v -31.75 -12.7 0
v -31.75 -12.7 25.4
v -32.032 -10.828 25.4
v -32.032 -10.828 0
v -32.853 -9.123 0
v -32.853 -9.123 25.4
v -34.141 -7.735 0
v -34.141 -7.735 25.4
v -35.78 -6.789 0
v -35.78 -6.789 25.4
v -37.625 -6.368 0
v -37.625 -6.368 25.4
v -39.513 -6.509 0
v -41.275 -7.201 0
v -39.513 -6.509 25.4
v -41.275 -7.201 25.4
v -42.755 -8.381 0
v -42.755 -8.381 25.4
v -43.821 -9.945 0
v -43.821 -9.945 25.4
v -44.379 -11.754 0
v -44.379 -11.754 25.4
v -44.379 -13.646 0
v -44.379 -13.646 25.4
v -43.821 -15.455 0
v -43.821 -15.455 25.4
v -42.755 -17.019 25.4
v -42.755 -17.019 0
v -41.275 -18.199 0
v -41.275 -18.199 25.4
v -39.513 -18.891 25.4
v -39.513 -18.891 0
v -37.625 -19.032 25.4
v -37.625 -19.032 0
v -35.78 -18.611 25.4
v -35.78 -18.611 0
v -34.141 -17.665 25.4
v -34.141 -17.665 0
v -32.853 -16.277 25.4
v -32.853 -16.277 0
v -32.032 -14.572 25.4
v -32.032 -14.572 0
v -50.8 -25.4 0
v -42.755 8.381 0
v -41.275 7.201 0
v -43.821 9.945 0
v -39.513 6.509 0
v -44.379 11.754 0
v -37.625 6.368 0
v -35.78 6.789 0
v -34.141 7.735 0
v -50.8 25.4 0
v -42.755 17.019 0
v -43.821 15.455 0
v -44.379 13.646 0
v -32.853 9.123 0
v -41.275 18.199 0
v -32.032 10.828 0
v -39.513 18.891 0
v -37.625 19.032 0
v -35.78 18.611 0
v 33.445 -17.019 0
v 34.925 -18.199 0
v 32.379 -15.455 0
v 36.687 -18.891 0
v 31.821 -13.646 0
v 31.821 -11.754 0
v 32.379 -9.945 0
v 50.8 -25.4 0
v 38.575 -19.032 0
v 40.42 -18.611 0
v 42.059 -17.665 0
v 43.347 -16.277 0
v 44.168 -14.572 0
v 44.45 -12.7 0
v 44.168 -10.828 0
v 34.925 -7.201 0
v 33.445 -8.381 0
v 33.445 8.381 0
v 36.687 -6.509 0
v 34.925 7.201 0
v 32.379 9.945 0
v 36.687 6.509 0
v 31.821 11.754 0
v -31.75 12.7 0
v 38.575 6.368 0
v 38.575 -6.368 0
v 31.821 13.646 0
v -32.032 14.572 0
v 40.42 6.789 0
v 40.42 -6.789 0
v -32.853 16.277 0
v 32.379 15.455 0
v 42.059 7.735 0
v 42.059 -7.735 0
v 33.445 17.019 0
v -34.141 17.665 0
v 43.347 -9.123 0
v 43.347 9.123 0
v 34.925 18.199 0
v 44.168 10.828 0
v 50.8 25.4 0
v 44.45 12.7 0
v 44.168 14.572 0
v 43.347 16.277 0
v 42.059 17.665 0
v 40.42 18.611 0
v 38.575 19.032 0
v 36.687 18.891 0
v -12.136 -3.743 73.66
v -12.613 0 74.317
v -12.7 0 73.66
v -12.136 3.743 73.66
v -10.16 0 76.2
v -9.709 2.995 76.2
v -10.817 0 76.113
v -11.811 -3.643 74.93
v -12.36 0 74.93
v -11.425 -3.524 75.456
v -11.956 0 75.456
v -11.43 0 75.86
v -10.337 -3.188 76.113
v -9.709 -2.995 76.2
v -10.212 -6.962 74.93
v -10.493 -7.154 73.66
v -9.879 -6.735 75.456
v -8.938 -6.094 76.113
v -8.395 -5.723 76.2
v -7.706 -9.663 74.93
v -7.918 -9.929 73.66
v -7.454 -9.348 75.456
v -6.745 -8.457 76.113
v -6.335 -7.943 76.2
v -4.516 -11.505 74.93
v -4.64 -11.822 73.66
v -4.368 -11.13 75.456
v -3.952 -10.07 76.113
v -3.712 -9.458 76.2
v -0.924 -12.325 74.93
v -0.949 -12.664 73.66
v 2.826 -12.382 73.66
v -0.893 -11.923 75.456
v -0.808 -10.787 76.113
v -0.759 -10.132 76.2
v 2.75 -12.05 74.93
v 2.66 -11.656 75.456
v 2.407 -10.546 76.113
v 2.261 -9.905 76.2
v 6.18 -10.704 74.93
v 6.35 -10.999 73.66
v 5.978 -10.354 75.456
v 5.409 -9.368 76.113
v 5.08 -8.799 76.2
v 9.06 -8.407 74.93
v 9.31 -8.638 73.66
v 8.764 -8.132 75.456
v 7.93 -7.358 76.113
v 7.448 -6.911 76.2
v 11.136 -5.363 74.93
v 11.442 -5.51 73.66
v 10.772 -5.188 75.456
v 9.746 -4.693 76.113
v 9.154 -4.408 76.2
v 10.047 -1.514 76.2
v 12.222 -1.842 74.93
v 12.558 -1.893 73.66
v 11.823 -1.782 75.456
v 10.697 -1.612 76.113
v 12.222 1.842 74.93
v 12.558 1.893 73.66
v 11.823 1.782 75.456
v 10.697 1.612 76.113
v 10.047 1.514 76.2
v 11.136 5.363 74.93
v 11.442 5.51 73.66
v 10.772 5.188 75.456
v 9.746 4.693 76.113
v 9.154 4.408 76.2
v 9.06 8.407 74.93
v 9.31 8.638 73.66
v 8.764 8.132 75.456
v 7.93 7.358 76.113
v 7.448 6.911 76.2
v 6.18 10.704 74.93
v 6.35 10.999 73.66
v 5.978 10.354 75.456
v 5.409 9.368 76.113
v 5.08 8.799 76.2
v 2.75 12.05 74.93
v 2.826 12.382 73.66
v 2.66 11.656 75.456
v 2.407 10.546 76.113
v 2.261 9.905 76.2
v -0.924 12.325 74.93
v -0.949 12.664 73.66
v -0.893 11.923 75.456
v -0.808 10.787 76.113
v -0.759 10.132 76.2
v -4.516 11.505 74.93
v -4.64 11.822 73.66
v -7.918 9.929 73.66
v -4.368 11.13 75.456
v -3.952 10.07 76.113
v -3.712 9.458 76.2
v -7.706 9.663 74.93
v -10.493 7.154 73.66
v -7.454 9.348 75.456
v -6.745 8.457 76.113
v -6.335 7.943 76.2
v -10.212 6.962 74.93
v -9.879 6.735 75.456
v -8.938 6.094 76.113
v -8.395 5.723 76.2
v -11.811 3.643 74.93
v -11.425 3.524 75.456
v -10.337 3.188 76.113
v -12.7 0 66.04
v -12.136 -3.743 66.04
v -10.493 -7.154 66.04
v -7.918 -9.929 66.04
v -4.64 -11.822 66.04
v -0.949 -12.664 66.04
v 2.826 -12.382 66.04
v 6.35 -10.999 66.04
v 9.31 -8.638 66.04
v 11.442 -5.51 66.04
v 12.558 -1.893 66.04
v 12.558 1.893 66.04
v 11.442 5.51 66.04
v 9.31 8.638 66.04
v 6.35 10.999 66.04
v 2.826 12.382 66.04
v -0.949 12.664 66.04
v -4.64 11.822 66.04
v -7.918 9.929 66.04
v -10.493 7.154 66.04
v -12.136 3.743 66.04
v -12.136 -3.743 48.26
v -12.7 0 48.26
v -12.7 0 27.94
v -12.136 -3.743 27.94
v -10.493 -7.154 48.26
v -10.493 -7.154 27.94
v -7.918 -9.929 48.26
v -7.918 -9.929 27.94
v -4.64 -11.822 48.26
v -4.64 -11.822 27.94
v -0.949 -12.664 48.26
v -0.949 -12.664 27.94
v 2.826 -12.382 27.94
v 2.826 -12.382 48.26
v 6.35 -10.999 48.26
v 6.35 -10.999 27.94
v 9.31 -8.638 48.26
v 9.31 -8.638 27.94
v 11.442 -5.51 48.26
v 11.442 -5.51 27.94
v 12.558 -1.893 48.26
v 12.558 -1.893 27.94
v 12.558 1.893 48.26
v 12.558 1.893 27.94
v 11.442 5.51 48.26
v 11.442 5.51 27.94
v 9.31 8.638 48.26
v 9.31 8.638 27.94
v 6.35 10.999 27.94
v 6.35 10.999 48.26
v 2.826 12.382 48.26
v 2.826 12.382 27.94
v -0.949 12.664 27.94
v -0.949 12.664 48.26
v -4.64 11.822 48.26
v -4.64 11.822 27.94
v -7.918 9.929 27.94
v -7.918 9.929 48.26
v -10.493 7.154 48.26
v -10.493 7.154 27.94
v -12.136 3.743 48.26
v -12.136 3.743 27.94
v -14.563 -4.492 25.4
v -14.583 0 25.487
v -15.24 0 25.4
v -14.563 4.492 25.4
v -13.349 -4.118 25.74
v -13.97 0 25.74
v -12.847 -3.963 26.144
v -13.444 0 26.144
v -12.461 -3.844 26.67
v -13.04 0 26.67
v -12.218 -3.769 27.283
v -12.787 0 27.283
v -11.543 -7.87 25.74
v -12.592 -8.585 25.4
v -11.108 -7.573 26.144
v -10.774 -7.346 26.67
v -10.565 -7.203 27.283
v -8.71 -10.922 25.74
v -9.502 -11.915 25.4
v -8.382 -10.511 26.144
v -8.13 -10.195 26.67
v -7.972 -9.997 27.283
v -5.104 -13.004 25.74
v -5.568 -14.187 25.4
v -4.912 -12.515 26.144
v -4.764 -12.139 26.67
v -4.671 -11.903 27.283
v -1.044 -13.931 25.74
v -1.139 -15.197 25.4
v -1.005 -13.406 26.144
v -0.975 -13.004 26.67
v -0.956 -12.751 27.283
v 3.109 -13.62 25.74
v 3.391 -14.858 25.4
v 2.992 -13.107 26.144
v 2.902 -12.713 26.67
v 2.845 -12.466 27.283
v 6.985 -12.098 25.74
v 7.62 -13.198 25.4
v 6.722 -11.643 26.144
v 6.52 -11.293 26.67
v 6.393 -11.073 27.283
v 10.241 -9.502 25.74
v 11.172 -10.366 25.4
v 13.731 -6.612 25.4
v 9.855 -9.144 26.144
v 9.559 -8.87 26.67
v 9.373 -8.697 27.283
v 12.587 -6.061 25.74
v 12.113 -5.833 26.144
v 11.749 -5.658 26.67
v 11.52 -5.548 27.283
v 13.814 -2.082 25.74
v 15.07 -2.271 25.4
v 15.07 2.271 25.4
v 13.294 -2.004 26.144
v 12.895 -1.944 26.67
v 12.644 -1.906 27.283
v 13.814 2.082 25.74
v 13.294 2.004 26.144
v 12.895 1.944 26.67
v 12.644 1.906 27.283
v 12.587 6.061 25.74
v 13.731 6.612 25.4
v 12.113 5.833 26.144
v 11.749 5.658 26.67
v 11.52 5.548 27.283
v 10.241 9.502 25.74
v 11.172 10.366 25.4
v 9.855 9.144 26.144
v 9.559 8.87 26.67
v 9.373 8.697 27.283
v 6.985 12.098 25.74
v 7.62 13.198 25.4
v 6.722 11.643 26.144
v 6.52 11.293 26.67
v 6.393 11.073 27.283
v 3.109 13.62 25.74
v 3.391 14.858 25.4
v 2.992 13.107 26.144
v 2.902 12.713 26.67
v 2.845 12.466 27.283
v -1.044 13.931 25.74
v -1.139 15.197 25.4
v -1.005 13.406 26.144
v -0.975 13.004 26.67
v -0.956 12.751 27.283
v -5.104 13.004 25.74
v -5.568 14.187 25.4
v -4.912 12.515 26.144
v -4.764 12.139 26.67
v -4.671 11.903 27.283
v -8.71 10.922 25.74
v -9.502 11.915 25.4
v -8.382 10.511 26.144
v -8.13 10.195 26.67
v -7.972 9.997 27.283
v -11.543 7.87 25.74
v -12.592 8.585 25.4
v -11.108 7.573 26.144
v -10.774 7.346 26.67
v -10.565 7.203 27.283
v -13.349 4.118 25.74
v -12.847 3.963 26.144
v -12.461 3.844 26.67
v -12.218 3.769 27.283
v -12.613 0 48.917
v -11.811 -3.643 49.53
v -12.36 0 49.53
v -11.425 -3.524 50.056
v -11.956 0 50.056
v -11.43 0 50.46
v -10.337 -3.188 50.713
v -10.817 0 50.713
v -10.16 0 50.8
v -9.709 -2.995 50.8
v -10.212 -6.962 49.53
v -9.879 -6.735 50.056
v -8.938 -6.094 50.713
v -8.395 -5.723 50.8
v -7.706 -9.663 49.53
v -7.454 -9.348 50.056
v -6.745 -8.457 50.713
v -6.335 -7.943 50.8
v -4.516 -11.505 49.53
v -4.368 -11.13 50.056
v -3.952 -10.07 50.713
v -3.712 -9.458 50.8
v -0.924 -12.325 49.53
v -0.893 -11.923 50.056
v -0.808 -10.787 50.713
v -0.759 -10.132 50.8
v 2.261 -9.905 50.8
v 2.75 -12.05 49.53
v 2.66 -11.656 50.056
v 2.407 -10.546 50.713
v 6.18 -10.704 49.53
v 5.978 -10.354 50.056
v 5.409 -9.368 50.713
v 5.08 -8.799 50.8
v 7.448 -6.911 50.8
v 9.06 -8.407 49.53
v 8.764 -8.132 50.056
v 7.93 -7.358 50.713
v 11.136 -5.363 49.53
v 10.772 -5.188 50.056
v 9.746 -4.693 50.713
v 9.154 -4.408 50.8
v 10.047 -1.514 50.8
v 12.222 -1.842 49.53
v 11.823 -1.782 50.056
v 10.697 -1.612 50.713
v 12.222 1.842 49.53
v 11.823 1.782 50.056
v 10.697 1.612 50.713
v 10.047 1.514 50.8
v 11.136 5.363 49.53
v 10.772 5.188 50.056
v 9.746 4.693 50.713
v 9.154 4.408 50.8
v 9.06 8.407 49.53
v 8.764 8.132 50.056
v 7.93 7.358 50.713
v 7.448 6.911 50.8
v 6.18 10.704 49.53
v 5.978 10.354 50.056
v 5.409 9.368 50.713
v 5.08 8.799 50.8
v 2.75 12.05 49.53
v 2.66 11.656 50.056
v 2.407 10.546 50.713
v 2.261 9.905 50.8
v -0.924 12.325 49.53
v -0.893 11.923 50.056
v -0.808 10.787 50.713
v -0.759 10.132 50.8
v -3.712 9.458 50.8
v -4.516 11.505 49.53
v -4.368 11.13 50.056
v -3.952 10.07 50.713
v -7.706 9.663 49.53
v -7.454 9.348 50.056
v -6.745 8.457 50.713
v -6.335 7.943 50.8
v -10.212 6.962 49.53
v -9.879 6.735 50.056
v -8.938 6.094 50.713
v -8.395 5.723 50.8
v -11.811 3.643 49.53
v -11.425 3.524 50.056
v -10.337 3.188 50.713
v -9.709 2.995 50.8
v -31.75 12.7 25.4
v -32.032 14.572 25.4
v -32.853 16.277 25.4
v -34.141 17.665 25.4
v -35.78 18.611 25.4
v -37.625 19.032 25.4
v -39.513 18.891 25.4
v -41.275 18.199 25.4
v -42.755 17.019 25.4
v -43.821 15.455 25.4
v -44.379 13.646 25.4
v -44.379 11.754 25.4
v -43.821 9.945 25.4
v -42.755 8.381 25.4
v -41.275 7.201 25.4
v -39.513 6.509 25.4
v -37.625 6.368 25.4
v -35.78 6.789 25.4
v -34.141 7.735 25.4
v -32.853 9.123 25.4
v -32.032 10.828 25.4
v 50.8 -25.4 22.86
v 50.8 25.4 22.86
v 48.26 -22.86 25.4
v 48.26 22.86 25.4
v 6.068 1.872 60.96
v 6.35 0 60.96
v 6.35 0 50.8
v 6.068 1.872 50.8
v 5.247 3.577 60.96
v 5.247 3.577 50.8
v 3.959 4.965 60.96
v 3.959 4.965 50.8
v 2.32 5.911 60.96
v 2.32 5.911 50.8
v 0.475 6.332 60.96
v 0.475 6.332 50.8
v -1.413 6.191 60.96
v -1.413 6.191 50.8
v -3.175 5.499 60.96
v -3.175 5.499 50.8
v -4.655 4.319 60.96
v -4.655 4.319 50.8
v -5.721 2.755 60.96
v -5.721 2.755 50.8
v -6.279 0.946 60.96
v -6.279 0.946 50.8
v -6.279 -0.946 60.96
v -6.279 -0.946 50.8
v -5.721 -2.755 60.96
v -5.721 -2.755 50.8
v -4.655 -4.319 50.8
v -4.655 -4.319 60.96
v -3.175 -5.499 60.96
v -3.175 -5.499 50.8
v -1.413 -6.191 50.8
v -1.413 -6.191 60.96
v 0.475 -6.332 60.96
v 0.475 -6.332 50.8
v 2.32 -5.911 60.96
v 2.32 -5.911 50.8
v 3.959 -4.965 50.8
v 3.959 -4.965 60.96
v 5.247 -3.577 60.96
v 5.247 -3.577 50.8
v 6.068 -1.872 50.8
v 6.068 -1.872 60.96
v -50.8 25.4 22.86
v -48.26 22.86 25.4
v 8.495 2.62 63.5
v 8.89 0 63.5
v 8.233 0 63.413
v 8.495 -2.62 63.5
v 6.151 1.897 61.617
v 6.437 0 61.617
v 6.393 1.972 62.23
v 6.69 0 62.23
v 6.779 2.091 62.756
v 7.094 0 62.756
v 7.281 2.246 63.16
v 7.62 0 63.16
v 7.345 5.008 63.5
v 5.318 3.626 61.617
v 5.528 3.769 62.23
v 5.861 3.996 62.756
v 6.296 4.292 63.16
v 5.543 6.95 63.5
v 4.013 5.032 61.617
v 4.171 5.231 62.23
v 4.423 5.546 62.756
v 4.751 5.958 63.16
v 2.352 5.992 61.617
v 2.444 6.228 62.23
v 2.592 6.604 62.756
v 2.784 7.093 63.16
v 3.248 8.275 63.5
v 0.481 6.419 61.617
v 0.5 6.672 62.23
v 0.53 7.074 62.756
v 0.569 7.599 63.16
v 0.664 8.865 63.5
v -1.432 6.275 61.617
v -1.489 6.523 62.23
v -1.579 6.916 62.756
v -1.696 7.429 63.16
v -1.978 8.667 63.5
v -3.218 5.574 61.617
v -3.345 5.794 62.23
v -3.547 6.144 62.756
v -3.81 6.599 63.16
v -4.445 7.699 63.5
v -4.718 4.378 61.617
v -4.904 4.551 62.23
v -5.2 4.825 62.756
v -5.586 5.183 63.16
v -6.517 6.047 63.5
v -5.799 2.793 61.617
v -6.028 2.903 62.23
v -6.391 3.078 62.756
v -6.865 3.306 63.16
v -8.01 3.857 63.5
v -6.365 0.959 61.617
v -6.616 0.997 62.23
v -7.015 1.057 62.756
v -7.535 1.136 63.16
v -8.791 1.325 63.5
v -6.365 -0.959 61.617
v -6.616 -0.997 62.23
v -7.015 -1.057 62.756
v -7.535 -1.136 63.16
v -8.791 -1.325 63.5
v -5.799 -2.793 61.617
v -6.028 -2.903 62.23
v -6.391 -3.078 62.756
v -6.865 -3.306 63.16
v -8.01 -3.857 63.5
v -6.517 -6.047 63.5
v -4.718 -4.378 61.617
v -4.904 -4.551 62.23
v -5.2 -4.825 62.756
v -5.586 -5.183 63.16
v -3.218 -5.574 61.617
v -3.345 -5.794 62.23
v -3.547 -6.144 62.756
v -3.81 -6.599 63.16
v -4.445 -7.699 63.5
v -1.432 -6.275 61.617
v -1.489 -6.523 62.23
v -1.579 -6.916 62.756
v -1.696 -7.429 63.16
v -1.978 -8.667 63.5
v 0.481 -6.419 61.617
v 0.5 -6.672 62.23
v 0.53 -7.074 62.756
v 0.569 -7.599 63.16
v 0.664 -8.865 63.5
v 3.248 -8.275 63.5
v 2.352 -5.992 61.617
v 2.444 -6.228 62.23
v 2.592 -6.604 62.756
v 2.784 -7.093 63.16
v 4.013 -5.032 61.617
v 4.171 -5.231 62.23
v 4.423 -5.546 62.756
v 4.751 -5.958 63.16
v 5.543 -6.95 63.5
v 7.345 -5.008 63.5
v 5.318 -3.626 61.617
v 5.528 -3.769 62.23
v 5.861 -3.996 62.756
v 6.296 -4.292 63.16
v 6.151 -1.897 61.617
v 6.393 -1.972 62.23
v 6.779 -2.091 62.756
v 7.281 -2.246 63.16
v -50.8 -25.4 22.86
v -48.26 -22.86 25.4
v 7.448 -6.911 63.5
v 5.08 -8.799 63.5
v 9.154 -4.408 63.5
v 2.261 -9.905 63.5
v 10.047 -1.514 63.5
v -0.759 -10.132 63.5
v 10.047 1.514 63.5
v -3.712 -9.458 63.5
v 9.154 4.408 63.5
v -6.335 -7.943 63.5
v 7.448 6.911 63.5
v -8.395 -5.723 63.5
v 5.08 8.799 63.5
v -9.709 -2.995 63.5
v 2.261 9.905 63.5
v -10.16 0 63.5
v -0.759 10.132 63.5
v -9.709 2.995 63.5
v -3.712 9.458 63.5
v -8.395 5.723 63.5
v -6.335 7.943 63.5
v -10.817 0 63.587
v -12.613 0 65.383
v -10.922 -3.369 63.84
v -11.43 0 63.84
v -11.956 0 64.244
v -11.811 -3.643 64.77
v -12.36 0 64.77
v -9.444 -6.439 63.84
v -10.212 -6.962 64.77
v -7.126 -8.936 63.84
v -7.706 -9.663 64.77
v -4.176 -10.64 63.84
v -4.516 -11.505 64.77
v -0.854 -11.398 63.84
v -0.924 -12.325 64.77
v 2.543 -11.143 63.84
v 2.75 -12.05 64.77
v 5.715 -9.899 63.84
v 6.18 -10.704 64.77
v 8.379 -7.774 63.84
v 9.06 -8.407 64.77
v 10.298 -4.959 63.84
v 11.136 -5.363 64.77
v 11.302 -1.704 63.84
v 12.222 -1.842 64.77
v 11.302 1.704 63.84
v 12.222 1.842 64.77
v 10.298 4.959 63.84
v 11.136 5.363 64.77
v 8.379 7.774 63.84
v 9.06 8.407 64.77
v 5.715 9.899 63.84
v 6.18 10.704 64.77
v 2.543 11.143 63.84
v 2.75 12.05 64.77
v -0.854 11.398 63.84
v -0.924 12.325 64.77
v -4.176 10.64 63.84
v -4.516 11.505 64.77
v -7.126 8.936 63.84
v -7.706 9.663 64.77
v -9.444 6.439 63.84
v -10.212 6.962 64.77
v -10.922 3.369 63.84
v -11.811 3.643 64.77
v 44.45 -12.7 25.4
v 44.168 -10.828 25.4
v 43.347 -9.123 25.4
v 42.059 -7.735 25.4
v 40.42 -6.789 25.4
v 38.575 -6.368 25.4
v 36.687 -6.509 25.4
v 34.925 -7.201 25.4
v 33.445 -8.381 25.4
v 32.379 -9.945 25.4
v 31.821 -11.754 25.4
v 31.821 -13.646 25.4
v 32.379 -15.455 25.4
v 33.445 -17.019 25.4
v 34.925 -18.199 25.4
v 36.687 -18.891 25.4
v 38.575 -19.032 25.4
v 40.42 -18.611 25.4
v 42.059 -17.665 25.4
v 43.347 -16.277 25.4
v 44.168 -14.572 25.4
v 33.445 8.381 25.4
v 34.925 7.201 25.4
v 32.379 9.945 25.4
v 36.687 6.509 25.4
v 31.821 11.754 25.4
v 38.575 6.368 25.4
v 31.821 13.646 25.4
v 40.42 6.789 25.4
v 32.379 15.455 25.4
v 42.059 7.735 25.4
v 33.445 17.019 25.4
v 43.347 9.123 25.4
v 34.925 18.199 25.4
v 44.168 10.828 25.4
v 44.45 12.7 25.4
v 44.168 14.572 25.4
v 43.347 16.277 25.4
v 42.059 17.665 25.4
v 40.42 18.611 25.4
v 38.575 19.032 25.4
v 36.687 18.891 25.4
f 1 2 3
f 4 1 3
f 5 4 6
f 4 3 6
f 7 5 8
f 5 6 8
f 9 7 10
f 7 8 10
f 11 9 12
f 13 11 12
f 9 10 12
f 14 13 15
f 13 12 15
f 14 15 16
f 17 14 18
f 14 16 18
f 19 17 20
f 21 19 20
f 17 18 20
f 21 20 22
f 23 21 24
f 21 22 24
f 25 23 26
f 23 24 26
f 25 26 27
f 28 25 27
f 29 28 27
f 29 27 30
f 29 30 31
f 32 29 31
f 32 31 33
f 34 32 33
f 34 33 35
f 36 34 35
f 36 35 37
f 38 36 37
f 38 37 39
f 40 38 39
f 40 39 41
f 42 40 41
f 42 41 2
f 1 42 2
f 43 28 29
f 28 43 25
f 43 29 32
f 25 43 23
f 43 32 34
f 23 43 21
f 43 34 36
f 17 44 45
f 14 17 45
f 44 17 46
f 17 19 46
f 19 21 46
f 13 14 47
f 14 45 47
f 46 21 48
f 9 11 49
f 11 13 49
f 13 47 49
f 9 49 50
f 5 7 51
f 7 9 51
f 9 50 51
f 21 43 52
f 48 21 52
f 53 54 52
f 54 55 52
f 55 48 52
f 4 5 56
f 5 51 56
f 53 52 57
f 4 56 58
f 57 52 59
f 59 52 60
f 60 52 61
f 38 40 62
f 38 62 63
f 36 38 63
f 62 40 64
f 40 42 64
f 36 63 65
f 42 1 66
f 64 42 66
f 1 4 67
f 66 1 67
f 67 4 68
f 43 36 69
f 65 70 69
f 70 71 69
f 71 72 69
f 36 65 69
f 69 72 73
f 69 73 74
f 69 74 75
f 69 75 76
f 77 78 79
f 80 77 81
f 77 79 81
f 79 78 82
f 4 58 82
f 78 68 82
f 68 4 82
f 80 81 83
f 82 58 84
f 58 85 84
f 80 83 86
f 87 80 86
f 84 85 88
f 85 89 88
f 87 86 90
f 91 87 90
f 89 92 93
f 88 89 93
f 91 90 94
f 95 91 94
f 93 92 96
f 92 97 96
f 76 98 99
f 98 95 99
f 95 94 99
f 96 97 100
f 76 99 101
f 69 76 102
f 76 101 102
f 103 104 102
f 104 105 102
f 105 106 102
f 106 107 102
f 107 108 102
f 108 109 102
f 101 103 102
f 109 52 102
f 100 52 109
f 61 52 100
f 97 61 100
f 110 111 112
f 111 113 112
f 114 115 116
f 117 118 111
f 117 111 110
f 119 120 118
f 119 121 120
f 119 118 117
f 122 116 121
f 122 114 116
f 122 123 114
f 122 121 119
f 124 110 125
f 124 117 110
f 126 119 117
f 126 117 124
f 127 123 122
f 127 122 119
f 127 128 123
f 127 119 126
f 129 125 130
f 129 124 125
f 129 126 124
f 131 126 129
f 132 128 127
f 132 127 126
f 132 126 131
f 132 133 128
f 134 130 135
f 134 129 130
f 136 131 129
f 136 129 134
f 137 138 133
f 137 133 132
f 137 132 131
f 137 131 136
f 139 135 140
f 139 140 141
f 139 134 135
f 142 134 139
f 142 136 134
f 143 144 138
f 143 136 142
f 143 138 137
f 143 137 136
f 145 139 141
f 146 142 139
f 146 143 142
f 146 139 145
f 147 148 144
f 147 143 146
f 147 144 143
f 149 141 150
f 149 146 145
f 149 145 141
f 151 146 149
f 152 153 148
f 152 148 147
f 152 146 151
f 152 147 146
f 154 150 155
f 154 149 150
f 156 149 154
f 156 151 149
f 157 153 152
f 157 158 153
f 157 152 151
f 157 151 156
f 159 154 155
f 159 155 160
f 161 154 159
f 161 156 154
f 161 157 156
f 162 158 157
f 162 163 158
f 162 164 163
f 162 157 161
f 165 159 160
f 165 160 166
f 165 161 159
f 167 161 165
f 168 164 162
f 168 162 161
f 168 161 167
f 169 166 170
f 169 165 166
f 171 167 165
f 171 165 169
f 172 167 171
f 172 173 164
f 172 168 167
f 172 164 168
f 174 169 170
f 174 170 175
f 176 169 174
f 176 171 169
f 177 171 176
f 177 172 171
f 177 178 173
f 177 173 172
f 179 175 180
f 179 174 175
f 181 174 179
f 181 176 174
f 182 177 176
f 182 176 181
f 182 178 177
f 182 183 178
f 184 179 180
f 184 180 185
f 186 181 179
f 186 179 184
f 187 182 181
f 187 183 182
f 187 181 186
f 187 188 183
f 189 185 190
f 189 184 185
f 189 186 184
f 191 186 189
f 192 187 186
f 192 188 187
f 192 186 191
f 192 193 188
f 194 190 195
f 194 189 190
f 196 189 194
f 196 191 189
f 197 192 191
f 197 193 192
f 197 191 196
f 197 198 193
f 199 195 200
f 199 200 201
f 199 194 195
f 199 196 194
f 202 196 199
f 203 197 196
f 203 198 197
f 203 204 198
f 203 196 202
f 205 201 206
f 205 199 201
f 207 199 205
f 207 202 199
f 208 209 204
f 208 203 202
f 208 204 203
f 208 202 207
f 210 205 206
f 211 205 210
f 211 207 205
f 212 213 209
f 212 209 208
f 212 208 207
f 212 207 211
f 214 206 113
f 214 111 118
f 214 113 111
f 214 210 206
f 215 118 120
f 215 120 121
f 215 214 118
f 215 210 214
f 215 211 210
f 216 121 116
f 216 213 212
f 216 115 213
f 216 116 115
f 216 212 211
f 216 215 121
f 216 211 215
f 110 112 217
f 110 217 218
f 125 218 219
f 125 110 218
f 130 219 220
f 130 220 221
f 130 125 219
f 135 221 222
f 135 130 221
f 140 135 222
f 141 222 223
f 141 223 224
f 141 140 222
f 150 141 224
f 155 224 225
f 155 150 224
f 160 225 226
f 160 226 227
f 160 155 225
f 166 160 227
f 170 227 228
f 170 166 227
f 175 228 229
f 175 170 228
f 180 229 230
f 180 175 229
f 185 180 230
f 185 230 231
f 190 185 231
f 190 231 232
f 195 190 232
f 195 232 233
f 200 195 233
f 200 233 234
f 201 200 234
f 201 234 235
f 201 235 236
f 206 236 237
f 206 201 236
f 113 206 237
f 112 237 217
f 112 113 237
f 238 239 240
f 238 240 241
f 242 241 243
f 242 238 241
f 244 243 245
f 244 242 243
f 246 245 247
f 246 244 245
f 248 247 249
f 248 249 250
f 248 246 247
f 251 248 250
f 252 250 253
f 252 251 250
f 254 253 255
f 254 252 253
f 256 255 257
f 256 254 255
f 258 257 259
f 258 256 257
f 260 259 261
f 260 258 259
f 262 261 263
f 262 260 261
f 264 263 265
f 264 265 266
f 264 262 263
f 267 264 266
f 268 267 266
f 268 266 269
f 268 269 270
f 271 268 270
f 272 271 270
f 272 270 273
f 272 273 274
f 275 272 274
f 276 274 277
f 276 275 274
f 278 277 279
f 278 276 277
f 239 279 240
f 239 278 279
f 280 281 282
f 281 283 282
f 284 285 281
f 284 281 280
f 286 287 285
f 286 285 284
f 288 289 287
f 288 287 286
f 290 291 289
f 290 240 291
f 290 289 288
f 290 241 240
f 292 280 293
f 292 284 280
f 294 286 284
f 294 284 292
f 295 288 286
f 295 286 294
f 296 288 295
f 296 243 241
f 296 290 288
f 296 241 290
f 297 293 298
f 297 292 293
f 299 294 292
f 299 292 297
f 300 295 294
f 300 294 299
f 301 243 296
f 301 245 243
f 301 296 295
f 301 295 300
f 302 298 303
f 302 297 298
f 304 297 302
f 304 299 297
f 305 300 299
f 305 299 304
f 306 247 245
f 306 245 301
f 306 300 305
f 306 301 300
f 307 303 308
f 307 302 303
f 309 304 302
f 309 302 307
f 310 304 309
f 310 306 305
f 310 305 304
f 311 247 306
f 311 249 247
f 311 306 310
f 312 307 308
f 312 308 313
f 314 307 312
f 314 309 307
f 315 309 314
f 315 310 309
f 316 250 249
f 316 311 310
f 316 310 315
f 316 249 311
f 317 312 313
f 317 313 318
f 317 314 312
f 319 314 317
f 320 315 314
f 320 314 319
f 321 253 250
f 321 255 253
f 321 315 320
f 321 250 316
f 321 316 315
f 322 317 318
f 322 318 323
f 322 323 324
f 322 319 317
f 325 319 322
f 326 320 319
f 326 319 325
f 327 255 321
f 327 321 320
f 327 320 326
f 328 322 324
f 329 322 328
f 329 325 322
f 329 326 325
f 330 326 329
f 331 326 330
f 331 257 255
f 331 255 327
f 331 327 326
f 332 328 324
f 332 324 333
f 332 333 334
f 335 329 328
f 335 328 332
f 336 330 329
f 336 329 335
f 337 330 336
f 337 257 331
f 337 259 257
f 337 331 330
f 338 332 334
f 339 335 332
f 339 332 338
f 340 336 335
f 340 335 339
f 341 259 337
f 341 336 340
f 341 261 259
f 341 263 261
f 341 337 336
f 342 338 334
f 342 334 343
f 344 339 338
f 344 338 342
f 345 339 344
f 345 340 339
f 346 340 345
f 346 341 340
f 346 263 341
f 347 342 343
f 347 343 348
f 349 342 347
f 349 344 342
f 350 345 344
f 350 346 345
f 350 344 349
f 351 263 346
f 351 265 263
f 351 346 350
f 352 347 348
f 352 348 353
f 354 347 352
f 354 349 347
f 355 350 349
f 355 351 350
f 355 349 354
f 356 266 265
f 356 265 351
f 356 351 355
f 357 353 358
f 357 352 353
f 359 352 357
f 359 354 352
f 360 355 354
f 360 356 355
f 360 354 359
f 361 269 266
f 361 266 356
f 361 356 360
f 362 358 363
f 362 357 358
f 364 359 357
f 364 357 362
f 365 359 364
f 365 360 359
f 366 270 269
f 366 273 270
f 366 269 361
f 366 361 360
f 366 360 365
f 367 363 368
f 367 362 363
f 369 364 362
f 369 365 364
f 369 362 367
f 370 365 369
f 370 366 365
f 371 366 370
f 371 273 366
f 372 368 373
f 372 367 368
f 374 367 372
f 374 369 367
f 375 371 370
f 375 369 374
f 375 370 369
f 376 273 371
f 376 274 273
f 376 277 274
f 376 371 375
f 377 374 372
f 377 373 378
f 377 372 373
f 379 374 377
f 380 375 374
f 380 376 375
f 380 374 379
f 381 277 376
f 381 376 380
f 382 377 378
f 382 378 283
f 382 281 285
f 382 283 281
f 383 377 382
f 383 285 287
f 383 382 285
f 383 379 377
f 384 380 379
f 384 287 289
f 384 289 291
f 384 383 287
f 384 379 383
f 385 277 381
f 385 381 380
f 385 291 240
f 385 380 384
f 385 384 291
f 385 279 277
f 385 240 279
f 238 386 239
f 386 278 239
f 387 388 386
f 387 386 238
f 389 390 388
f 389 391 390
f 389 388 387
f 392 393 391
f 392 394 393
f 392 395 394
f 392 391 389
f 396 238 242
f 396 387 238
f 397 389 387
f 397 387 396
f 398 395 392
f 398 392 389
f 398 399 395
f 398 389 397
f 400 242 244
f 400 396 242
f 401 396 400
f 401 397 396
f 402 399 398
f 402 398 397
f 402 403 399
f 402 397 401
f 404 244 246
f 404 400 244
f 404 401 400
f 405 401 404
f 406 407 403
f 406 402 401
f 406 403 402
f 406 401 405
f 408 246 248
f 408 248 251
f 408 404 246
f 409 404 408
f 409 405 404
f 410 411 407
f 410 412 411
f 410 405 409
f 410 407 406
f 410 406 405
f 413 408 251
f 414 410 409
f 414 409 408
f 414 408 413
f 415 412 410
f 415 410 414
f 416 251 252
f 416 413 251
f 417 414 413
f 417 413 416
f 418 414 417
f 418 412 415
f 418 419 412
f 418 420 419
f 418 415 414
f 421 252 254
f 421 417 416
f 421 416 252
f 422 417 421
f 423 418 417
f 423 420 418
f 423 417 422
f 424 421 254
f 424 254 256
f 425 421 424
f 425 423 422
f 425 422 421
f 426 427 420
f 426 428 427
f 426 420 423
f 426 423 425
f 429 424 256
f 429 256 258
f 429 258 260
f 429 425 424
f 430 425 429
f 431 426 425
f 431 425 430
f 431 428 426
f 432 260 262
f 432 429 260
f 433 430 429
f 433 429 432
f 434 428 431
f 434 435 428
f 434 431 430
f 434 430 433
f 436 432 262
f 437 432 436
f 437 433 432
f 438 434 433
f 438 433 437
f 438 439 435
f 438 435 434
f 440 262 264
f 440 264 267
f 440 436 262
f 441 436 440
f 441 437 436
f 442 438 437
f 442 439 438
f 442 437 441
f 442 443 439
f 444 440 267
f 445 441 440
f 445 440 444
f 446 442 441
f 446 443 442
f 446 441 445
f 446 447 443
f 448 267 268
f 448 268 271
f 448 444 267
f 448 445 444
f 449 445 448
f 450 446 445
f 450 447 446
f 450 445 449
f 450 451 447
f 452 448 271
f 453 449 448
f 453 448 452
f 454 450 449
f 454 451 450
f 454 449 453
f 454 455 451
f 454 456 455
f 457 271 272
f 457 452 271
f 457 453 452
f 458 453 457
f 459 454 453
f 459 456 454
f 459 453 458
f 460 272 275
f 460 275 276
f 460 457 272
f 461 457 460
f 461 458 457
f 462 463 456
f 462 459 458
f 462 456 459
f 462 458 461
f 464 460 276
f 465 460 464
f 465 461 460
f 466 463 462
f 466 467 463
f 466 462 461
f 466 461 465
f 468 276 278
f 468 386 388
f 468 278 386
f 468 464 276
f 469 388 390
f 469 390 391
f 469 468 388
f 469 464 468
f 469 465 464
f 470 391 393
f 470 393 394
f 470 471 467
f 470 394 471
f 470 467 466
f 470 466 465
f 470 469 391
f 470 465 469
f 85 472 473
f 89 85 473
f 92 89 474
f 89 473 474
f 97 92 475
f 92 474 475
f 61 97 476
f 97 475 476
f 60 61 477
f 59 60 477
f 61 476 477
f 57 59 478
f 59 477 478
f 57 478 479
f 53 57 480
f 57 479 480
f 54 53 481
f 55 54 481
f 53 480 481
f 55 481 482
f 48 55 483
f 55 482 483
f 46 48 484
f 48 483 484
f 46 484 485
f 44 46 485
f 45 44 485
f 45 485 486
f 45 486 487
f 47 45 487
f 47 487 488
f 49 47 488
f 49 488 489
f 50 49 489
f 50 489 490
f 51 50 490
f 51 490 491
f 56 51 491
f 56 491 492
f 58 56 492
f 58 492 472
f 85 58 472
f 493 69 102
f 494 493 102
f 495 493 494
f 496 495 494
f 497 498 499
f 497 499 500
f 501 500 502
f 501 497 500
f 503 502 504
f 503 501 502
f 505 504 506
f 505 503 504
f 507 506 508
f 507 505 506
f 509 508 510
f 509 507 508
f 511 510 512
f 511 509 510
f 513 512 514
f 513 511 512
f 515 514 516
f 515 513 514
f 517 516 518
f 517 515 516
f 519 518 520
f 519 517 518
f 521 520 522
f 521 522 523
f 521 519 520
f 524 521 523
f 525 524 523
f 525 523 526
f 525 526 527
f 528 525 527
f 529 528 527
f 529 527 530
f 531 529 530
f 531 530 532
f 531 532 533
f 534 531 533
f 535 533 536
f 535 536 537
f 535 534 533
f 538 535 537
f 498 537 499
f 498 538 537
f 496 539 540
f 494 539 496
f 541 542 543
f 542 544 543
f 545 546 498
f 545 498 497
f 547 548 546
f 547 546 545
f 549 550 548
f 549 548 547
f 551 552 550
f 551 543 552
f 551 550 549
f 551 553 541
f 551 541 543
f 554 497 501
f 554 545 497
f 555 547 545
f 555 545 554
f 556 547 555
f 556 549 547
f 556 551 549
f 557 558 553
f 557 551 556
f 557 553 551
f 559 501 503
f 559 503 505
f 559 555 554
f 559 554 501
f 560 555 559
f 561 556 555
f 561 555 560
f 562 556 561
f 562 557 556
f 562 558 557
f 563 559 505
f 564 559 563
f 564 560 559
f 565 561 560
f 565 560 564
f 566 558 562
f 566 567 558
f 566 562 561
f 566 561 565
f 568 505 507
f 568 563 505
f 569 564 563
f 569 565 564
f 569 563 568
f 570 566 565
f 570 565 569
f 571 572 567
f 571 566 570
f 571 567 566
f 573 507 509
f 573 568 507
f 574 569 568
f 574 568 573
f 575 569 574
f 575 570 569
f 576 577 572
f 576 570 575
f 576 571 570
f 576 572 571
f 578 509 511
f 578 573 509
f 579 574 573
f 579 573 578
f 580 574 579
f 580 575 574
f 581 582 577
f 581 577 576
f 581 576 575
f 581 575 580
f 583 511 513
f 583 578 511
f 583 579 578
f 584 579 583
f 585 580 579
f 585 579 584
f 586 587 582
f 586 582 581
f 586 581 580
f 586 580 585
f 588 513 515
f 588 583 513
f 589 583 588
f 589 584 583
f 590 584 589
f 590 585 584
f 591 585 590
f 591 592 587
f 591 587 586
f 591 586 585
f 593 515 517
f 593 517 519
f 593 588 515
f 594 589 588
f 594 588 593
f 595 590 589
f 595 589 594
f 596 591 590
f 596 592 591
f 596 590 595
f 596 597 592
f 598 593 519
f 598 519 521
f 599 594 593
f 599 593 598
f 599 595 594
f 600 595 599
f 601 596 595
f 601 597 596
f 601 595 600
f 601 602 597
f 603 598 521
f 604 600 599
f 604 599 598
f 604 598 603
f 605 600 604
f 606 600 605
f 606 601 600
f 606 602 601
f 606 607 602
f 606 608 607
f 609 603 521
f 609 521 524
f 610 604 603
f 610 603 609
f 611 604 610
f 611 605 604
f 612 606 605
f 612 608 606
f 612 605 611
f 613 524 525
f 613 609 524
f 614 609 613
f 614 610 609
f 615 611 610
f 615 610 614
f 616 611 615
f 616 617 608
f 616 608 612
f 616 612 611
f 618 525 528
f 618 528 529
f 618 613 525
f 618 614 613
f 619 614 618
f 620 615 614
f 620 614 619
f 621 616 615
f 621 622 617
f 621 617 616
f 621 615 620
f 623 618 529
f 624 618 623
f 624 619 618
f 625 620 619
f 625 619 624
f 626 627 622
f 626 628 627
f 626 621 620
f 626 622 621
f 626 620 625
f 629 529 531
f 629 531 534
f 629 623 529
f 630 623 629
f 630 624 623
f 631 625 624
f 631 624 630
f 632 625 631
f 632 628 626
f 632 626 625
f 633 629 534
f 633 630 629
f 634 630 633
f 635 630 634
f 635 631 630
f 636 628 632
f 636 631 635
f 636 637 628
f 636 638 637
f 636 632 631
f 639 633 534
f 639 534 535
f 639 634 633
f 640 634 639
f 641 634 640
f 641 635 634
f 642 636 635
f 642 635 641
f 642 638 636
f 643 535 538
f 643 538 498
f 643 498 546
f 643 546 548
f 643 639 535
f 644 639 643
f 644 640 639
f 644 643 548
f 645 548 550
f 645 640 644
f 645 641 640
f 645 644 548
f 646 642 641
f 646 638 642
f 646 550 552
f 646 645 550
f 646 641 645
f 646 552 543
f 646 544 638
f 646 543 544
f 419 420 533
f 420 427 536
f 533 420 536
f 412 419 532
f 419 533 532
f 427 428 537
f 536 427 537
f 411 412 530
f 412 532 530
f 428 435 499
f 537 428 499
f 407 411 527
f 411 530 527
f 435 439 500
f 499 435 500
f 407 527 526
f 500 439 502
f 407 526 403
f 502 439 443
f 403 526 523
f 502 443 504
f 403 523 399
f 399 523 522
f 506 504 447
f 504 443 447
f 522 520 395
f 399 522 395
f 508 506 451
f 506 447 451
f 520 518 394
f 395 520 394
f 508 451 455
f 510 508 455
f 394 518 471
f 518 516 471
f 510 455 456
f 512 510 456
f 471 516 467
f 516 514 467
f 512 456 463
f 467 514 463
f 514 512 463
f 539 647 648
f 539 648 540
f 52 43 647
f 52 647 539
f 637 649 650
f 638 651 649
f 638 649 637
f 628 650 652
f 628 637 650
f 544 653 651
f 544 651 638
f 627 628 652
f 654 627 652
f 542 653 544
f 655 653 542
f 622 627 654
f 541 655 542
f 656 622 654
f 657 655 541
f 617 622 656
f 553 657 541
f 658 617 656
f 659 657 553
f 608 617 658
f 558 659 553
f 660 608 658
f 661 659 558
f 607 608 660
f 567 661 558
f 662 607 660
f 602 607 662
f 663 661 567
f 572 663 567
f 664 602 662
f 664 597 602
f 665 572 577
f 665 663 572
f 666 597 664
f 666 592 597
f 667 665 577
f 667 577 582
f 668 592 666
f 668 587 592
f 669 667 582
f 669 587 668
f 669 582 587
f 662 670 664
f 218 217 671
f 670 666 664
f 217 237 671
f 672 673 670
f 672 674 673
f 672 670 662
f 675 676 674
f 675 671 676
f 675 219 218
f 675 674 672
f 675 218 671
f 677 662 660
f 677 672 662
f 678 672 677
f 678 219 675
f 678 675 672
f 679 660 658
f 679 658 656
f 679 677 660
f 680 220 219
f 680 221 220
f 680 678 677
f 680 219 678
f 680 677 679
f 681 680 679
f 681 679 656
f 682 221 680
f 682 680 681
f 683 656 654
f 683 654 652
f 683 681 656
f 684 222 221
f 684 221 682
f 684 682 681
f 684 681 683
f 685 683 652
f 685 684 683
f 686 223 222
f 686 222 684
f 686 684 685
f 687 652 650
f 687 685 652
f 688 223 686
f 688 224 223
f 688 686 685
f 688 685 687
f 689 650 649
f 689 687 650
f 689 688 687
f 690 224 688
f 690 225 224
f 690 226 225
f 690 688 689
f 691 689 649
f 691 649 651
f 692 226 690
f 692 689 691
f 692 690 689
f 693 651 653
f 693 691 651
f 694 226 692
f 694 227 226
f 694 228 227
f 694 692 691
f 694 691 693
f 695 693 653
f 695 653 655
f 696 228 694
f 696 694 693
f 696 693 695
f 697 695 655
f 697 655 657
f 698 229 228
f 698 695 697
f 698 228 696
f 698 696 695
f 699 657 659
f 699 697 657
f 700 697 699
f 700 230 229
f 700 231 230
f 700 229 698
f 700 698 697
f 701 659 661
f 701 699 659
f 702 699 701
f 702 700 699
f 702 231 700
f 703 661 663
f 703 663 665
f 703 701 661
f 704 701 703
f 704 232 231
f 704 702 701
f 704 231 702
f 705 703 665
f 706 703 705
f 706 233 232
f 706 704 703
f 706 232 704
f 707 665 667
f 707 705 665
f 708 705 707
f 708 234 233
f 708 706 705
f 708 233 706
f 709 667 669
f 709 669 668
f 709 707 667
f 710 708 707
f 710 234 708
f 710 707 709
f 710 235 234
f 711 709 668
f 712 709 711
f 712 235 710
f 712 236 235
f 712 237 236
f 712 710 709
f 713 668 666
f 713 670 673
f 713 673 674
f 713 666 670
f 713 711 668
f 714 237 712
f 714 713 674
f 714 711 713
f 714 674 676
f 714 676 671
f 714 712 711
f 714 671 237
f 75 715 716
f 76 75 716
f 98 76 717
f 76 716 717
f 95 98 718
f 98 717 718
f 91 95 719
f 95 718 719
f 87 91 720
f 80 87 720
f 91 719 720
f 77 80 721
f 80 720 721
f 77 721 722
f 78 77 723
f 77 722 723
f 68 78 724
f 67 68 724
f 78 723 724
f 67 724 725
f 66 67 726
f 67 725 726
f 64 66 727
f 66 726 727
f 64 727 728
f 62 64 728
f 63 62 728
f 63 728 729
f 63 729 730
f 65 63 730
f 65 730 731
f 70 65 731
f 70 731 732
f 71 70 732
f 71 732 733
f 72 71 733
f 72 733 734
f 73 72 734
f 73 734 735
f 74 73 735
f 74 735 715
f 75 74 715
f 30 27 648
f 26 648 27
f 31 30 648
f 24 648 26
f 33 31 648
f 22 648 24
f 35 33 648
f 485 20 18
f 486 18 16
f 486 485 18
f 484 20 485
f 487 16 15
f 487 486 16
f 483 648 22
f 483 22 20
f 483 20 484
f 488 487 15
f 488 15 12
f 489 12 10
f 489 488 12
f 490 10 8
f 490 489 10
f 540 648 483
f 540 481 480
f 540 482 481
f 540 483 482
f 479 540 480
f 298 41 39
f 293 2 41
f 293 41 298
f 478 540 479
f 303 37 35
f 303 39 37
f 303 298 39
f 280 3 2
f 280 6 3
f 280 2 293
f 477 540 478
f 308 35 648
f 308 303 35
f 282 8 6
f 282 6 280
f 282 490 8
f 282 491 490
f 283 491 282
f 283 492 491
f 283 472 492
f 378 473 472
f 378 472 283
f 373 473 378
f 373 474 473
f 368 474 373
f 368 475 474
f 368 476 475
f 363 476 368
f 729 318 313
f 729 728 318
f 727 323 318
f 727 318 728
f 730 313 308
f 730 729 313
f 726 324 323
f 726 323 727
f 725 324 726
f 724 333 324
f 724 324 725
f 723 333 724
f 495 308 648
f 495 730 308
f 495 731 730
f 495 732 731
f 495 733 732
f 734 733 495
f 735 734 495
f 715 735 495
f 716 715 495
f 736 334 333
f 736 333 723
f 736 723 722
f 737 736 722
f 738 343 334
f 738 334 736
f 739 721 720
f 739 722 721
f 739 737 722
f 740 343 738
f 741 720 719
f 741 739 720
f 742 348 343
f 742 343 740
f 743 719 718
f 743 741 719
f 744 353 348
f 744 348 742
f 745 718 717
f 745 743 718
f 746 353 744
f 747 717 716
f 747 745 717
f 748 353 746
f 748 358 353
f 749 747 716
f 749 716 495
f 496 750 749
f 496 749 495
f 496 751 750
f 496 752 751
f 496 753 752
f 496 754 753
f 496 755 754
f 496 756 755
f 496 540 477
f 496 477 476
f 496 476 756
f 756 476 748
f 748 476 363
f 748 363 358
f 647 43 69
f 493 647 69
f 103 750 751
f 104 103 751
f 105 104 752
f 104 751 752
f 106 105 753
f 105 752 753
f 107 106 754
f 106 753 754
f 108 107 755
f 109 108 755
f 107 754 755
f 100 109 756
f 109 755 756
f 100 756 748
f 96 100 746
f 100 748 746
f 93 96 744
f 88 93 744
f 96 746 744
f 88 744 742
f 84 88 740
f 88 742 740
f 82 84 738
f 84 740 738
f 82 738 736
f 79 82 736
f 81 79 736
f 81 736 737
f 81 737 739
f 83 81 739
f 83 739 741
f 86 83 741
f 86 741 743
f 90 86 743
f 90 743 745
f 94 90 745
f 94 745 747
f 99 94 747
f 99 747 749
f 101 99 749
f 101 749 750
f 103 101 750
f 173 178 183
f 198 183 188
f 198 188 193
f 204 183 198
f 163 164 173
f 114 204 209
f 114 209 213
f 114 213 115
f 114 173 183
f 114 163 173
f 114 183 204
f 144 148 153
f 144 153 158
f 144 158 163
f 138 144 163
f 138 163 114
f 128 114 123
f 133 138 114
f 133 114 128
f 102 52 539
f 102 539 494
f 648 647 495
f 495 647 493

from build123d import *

# Parameters (mm, degrees)
F0_W     = 101.6
F0_H     = 50.8
F1_DEPTH = 25.4
F2_R     = 6.35
F3_DEPTH = 25.401
F4_W     = 12.7
F4_H     = 50.8
F6_W     = 11.6320042121
F6_H     = 12.7
F8_R     = 2.54
F9_SIZE  = 2.54


with BuildPart() as f1:
    # F0 (on Top) → F1 (new body)
    with BuildSketch(Plane.XY):
        Rectangle(F0_W, F0_H)
    extrude(amount=F1_DEPTH)

    # F2 (on face) → F3 (cut, through all)
    with BuildSketch(Plane.XY.offset(25.4)):
        with Locations((-38.1, 12.7)):
            Circle(F2_R)
        with Locations((-38.1, -12.7)):
            Circle(F2_R)
        with Locations((38.1, -12.7)):
            Circle(F2_R)
        with Locations((38.1, 12.7)):
            Circle(F2_R)
    extrude(amount=-F3_DEPTH, mode=Mode.SUBTRACT)

    # F4 (on Front) → F5 (revolve)
    with BuildSketch(Plane.XZ):
        with Locations((-6.35, 50.8)):
            Rectangle(F4_W, F4_H)
    revolve(axis=Axis((0, 0, 50.8), (0, 0, 1)))

    # F6 (on Front) → F7 (revolve, cut)
    with BuildSketch(Plane.XZ):
        with Locations((12.166002106, 57.15)):
            Rectangle(F6_W, F6_H)
    revolve(axis=Axis((0, 0, 43.5032770038), (0, 0, 1)), mode=Mode.SUBTRACT)

    # F8
    f8_edges = [f1.edges().sort_by_distance(p)[0] for p in [
        (12.7, 0, 50.8),
        (-6.35, 0, 63.5),
        (12.7, 0, 63.5),
        (12.7, 0, 25.4),
        (12.7, 0, 76.2),
    ]]
    fillet(f8_edges, radius=F8_R)

    # F9
    f9_edges = [f1.edges().sort_by_distance(p)[0] for p in [
        (0, -25.4, 25.4),
        (-50.8, 0, 25.4),
        (0, 25.4, 25.4),
        (50.8, 0, 25.4),
    ]]
    chamfer(f9_edges, length=F9_SIZE)


solid = f1.part
